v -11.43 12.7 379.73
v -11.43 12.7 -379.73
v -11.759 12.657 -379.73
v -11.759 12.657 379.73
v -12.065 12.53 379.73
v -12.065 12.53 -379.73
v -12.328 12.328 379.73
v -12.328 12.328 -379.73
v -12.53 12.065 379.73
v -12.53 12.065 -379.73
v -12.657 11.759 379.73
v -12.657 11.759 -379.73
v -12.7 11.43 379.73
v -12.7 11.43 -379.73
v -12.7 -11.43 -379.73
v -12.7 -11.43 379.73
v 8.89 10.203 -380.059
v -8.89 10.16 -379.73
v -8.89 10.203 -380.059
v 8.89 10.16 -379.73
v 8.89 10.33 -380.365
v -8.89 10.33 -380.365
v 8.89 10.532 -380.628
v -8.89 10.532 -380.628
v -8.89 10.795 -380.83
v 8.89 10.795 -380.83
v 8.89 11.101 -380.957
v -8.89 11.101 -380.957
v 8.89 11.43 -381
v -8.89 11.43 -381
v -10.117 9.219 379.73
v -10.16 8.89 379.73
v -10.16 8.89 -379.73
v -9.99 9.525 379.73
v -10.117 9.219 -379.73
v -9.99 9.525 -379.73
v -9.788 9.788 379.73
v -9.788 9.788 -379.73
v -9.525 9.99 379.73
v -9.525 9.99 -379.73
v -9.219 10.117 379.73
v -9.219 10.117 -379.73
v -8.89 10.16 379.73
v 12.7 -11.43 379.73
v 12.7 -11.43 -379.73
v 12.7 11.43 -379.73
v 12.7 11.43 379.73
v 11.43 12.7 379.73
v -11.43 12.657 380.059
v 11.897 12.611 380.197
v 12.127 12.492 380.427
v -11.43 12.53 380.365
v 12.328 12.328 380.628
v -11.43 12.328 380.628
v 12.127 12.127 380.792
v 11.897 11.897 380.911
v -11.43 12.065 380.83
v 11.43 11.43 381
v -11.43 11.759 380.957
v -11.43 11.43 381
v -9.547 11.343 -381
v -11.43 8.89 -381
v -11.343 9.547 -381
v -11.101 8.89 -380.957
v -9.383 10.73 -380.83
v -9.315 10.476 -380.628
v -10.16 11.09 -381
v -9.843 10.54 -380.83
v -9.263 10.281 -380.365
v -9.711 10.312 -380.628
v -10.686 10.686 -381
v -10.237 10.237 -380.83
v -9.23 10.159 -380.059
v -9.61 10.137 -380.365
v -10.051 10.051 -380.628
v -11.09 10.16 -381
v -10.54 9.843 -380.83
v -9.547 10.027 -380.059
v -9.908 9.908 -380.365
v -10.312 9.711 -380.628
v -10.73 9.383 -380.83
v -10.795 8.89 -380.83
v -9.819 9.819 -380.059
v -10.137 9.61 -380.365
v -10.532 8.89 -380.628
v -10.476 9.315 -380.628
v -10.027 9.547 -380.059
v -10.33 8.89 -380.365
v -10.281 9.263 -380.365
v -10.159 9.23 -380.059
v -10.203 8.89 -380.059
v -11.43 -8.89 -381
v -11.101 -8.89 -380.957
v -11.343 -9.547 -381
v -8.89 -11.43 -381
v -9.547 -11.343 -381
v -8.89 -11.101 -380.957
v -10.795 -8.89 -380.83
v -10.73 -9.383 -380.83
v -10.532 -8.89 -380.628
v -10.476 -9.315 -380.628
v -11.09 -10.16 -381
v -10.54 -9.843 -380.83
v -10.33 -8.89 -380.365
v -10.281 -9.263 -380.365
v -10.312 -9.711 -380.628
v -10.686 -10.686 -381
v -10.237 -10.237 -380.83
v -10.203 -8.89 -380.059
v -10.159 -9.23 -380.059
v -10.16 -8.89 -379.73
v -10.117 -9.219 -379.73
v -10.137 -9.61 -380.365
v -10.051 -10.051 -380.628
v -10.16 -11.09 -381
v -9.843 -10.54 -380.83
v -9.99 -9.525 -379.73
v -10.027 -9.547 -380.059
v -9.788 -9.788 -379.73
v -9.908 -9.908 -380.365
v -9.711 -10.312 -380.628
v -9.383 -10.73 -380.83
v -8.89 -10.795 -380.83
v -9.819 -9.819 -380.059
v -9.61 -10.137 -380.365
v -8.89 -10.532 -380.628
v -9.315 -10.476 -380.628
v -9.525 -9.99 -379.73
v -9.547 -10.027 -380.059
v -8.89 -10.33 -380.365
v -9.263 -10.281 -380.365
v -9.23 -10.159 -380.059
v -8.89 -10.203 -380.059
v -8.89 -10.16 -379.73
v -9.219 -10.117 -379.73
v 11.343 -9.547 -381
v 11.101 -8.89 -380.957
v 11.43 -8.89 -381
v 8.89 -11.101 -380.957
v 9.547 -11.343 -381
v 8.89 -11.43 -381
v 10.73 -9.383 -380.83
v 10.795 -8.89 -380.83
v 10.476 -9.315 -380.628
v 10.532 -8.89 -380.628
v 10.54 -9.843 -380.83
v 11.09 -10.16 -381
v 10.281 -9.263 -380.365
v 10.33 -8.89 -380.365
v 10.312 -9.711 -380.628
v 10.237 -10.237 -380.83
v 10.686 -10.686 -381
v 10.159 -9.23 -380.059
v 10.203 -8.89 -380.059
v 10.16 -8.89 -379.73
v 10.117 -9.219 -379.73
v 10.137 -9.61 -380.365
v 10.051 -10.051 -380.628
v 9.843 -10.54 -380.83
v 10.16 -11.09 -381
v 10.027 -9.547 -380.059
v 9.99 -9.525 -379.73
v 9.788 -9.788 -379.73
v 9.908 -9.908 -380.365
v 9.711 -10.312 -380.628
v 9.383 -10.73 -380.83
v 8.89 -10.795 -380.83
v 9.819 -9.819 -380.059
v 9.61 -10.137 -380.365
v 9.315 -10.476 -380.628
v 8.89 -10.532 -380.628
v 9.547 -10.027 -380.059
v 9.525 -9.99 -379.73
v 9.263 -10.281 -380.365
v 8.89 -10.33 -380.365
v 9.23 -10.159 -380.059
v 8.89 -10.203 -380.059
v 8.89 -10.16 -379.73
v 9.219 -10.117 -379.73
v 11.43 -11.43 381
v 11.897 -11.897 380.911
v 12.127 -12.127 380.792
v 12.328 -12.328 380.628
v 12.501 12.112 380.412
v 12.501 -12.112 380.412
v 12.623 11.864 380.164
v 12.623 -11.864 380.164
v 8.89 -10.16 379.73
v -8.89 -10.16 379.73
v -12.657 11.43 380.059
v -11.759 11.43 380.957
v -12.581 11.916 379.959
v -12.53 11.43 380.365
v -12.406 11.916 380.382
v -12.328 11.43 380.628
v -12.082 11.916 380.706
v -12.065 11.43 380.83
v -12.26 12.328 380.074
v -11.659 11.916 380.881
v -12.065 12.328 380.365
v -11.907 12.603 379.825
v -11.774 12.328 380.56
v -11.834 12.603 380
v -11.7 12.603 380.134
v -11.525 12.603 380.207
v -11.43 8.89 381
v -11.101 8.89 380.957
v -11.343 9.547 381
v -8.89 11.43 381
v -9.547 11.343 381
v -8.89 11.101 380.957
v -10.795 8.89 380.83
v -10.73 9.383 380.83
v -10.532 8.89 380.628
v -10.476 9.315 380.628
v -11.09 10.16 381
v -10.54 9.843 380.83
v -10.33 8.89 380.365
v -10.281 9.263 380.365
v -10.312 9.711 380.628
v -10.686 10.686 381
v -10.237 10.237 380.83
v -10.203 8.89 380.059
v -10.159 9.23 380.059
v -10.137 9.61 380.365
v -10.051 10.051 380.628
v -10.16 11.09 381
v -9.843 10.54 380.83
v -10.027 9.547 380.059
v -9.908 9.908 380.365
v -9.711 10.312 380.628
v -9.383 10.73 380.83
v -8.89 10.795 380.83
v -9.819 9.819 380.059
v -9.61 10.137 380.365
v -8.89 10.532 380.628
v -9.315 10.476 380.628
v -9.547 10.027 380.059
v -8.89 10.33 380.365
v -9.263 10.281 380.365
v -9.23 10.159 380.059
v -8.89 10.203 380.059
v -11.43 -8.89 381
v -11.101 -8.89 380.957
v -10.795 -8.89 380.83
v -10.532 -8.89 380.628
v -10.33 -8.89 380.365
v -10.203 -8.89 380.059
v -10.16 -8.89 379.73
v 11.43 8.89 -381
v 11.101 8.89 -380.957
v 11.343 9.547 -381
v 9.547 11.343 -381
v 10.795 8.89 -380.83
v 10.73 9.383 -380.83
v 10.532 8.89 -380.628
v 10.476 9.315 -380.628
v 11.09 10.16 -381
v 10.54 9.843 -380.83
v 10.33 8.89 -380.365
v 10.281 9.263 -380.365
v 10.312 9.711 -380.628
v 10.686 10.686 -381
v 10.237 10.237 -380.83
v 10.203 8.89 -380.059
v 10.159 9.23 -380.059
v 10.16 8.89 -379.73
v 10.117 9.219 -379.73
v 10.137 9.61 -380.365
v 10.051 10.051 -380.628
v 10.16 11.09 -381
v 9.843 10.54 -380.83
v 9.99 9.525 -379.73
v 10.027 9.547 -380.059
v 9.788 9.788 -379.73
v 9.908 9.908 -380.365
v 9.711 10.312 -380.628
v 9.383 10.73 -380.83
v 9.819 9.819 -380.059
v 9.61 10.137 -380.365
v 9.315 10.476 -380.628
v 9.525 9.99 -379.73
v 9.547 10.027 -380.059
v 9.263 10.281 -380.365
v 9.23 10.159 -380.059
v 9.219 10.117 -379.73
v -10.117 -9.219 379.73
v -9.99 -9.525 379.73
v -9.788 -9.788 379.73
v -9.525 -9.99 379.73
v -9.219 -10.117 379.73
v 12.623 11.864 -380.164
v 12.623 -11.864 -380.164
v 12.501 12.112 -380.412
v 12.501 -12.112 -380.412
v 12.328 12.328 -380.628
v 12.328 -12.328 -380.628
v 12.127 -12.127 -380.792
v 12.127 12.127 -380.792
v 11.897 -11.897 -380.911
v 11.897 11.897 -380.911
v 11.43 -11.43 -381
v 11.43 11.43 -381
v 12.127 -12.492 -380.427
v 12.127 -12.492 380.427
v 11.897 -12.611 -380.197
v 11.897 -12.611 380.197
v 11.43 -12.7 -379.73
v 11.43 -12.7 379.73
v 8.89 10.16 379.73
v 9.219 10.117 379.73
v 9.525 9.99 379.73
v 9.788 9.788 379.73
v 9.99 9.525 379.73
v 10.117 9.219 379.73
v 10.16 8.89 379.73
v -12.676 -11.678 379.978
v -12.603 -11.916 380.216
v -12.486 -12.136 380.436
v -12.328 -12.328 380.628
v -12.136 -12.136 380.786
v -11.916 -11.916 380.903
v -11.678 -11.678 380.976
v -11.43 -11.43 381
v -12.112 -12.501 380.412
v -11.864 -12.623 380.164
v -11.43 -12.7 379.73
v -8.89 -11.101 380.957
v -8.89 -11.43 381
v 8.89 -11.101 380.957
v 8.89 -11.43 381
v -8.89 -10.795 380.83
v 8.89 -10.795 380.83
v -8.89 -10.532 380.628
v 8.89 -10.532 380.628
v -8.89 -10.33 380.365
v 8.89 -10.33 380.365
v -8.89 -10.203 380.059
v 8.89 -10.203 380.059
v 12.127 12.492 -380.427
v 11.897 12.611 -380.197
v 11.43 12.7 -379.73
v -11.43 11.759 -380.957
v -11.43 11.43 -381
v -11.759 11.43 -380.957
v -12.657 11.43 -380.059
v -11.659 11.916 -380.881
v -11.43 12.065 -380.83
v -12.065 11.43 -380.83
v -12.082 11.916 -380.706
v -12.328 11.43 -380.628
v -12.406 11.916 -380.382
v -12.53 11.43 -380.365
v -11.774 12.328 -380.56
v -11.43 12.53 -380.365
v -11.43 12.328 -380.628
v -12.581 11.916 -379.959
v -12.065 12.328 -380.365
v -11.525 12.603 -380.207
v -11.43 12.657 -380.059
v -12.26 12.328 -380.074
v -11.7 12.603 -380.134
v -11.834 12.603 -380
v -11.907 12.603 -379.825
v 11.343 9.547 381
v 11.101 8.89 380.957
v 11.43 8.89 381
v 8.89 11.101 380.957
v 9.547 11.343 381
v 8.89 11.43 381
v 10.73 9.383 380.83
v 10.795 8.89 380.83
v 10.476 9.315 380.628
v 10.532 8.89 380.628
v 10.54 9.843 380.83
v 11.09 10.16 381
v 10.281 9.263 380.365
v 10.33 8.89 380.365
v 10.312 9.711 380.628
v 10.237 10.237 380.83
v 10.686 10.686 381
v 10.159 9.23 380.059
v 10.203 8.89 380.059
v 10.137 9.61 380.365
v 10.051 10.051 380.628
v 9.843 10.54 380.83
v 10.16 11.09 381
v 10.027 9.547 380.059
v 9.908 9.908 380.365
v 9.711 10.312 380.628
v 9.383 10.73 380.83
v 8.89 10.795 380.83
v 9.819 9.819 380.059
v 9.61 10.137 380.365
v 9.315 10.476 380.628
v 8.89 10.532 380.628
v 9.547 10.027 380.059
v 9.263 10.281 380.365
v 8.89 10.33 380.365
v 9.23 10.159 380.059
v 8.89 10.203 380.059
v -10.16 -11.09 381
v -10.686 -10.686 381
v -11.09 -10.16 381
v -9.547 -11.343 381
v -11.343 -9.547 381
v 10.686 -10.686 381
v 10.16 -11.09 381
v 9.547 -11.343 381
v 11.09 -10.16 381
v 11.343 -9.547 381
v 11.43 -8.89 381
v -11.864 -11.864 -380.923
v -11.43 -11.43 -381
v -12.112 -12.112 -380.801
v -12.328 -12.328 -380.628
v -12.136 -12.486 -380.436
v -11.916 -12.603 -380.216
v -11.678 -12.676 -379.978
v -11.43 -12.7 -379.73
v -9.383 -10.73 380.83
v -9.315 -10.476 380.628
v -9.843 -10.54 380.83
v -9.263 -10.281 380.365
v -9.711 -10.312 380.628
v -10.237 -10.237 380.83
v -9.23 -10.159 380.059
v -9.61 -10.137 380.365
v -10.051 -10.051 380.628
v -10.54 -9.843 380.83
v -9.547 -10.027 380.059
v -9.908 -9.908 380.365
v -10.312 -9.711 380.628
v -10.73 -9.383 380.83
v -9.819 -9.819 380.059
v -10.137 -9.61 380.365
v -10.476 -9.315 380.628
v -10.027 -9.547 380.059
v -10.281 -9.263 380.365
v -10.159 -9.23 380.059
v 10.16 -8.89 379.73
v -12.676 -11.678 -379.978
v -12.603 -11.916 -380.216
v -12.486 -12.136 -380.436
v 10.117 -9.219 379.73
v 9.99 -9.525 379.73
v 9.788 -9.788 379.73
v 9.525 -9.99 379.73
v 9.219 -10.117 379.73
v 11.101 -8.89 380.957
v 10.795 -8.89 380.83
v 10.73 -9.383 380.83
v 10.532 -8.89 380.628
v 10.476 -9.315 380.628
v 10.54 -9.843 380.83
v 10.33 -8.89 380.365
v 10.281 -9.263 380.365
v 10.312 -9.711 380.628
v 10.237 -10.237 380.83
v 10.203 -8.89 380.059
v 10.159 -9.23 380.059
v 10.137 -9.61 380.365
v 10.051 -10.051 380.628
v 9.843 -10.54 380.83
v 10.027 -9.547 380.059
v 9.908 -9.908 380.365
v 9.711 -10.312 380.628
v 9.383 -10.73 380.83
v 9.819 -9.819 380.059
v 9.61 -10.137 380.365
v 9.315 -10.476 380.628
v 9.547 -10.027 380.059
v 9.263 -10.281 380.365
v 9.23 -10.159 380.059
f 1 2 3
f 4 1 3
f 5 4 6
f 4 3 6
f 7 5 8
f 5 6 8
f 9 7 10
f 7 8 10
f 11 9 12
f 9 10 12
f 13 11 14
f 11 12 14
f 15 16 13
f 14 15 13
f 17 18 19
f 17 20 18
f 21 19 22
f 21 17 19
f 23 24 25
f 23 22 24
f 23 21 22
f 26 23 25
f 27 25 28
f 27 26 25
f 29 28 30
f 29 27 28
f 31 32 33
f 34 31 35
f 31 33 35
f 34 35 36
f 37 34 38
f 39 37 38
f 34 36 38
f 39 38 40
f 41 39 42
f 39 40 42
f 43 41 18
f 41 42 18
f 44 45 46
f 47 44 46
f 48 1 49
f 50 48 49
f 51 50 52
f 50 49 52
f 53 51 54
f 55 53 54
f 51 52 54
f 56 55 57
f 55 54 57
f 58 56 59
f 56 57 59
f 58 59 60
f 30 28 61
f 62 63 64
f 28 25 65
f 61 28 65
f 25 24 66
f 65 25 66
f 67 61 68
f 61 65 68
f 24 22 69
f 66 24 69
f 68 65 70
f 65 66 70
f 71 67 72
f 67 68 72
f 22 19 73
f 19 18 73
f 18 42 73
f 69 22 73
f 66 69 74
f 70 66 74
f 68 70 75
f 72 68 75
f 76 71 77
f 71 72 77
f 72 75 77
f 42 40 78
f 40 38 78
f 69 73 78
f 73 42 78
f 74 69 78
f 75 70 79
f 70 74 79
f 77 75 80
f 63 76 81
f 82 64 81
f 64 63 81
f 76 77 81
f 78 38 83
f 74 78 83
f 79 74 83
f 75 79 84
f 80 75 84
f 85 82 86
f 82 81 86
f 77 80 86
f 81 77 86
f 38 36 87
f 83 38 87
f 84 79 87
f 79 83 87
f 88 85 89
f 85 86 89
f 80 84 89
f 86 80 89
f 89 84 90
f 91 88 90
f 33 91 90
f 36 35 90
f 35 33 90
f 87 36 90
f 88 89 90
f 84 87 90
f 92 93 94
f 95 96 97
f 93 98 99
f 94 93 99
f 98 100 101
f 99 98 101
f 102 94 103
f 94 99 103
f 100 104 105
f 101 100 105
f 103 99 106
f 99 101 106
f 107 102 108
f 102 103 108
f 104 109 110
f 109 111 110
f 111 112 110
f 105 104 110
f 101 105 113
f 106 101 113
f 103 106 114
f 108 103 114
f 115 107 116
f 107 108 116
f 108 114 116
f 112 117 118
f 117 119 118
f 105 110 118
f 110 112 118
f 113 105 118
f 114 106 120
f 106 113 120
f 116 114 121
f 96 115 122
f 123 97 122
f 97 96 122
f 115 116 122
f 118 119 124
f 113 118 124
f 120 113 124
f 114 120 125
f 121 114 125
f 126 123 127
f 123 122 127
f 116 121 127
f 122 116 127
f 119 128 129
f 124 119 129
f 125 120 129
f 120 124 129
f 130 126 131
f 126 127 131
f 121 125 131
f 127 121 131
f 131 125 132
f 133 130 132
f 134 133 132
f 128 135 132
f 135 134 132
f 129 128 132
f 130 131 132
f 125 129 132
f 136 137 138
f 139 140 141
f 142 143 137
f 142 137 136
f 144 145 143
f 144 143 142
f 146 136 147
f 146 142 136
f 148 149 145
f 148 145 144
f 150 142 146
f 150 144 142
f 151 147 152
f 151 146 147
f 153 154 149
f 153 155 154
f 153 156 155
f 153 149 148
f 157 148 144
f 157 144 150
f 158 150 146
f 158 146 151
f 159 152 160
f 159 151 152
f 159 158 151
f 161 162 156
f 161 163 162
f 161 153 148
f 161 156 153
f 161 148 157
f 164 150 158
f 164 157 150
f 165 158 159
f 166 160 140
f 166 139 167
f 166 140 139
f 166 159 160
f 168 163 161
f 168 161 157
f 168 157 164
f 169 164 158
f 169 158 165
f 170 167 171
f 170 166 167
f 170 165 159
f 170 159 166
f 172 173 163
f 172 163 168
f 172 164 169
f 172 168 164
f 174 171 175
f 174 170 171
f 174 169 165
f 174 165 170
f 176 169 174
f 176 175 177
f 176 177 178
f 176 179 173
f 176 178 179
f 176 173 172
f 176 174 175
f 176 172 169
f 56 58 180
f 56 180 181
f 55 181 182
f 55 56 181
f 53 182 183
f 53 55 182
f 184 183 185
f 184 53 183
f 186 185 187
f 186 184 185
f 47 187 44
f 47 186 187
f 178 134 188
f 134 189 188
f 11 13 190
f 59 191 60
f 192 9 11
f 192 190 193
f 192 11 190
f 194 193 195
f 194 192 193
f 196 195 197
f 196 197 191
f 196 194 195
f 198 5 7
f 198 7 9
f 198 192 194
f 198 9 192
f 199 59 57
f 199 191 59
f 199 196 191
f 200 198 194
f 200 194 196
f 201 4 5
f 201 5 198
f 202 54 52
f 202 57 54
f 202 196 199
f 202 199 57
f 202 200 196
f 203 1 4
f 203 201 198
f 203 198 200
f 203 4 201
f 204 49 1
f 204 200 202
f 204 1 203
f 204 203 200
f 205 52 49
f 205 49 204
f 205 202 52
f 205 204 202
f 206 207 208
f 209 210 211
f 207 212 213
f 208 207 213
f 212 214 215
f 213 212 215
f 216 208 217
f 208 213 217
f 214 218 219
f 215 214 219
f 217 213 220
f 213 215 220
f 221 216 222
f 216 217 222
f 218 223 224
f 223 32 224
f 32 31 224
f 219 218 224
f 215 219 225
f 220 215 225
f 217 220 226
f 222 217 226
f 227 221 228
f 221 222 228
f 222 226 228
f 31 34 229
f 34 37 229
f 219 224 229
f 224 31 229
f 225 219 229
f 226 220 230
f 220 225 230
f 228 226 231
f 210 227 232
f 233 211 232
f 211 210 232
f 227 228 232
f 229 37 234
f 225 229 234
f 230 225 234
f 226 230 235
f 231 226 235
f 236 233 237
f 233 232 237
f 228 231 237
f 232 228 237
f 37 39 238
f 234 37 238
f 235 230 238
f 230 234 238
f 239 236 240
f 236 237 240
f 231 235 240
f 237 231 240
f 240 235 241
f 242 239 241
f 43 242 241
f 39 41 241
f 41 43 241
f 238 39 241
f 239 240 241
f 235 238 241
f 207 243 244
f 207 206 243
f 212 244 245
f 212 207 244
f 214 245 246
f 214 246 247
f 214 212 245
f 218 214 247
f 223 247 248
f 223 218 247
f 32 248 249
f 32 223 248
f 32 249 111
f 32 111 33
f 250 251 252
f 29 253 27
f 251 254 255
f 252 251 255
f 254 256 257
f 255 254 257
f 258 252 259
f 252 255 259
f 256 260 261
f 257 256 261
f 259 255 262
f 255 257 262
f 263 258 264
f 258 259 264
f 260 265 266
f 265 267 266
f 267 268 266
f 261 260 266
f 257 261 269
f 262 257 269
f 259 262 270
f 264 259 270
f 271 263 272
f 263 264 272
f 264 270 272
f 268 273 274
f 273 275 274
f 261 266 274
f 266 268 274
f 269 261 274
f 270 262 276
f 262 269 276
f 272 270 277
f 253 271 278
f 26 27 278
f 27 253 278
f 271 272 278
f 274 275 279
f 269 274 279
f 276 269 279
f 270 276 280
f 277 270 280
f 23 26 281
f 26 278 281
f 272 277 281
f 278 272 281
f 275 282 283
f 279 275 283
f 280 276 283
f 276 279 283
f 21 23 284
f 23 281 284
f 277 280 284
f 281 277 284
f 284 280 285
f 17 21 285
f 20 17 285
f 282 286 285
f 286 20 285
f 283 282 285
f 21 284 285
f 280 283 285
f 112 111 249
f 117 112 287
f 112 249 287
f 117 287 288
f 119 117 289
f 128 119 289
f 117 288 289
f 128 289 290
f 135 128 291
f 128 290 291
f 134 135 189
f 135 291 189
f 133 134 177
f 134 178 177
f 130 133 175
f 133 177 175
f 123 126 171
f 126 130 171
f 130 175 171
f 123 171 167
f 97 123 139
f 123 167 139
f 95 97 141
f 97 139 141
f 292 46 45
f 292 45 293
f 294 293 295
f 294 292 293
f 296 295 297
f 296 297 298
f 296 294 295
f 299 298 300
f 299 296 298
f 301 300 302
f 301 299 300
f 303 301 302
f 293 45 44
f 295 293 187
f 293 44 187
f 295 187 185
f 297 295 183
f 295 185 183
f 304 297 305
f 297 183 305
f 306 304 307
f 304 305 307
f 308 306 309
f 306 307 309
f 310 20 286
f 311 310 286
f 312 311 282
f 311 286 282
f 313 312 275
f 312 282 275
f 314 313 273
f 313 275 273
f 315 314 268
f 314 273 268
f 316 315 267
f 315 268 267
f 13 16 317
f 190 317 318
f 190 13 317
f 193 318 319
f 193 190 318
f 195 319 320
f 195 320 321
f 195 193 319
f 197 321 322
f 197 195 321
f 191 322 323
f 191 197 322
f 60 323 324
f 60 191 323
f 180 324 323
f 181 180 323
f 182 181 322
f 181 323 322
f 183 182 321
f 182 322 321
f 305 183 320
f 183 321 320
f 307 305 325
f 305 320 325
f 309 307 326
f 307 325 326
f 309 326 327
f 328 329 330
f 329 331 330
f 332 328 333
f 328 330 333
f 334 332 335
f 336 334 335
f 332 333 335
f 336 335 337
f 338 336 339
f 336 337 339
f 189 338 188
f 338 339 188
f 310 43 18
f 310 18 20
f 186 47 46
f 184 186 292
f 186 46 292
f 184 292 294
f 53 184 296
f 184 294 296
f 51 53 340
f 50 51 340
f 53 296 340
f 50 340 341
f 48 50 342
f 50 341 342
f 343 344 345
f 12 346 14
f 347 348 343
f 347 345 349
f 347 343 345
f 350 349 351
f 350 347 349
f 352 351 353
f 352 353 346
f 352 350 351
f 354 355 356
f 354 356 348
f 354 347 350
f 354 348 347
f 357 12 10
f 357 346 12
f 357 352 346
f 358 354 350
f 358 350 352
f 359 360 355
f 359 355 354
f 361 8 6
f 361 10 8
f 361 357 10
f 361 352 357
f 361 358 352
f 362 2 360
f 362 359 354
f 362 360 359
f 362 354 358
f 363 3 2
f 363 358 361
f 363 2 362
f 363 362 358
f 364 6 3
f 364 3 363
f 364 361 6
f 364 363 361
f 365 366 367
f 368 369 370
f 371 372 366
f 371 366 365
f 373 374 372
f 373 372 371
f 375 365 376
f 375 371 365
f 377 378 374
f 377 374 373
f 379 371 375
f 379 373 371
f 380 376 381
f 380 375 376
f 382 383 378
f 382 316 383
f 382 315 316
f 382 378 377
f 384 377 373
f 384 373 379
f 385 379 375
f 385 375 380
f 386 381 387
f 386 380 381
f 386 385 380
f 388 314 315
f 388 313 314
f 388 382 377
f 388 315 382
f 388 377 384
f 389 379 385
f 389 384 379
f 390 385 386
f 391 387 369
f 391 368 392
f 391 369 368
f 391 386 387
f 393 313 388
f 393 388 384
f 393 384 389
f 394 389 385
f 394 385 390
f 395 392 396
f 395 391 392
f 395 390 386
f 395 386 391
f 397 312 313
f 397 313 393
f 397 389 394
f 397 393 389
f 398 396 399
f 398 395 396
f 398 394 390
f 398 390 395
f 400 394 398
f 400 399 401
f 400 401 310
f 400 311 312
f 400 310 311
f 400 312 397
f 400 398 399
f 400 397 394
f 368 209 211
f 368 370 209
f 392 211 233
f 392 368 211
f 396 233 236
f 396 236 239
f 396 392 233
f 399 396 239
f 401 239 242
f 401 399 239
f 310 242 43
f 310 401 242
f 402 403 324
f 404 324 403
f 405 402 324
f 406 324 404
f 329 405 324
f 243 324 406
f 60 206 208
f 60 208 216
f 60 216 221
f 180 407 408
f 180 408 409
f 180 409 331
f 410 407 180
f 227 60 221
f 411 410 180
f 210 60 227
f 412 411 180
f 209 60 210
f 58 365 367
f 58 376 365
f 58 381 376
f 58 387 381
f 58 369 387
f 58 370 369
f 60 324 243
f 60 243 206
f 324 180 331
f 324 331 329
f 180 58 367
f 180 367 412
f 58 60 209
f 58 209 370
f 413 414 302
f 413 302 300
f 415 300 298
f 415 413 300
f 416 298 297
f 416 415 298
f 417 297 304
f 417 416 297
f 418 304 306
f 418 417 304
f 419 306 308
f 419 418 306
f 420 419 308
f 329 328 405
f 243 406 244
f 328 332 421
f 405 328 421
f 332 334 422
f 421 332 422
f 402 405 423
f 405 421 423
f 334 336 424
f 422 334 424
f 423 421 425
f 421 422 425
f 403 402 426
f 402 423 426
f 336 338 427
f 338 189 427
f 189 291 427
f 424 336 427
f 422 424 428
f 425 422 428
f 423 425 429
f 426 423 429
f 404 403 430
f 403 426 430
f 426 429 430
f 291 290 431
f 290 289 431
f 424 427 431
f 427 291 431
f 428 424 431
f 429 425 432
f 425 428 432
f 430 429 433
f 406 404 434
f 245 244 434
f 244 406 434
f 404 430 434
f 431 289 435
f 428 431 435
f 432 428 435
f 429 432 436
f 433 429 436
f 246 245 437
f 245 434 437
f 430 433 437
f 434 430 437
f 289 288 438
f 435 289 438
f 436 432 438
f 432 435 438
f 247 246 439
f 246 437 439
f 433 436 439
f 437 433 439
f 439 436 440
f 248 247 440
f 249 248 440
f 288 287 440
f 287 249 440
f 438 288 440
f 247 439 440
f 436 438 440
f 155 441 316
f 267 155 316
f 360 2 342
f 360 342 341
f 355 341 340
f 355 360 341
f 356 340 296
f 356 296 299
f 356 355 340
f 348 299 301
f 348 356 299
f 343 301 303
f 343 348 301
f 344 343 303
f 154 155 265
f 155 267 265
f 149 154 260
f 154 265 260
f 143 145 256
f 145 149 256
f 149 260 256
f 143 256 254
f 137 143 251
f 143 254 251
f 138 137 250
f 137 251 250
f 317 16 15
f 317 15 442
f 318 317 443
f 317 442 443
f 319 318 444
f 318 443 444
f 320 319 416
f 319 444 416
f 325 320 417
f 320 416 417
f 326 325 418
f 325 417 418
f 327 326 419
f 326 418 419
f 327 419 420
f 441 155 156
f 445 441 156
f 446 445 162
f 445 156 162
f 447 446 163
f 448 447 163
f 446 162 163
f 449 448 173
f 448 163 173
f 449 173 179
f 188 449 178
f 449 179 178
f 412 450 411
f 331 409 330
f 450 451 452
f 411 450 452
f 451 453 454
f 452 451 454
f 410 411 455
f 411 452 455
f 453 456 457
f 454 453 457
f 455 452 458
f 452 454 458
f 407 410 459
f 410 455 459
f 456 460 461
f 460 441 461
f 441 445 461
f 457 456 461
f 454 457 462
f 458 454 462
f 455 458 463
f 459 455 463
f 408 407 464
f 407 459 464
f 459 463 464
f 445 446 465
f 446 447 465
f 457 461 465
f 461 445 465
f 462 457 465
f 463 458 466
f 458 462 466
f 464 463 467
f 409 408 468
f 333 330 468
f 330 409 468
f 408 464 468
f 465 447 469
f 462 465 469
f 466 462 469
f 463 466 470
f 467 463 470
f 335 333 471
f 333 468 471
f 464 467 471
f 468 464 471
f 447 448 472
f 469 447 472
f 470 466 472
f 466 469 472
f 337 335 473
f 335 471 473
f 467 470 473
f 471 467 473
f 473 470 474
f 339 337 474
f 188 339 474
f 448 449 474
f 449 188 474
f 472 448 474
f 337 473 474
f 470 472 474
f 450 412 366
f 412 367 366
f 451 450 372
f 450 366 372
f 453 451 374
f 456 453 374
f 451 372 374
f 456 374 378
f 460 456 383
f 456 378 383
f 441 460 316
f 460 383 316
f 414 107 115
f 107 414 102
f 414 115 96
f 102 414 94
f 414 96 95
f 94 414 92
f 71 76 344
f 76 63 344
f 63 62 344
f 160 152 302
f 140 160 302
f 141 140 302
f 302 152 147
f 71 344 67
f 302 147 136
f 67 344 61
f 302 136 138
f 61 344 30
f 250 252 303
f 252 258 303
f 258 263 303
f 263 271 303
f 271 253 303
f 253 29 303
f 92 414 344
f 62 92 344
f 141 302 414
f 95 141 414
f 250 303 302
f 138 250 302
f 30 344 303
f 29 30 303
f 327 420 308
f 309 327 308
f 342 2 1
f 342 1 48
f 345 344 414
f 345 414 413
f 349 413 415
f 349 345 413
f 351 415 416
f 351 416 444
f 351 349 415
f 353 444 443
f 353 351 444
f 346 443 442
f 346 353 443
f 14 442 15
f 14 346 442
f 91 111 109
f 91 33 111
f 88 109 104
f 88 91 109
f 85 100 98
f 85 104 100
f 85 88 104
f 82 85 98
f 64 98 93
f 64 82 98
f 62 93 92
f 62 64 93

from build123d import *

# Parameters (mm, degrees)
F0_W         = 25.4
F0_H         = 25.4
F0_W_2       = 20.32
F0_H_2       = 20.32
F1_DEPTH     = 381
F2_R         = 1.26999
F3_T1_DEPTH  = 30.48001
F3_T3_DEPTH  = 768.35
F4_T1_DEPTH  = 26.03501
F4_T3_DEPTH  = 759.46
F4_T5_DEPTH  = 26.035
F4_S9_W      = 1.2954
F4_S9_H      = 1.2954
F4_T10_DEPTH = 1.2954
F4_S15_W     = 1.2954
F4_S15_H     = 1.2954
F4_T16_DEPTH = 1.2954


# Not quite as in the source:
# - a fillet or chamfer that OpenCascade refuses, or shapes differently, is made with other operations: its cross-section is extruded or revolved along the edge and cut away or added
# - a fillet or chamfer is up to 0.001 mm smaller than in the source, because OpenCascade refuses the exact size


with BuildPart() as f1:
    # F0 (on Top) → F1 (new body, symmetric)
    with BuildSketch(Plane.XY):
        Rectangle(F0_W, F0_H)
        Rectangle(F0_W_2, F0_H_2, mode=Mode.SUBTRACT)
    extrude(amount=F1_DEPTH, both=True)

    # F2 (radius 1.27 in the source; OpenCascade refuses exactly that, so slightly less here)
    f2_edges = [f1.edges().sort_by_distance(p)[0] for p in [
        (0, -10.16, -381),
        (-10.16, -10.16, 0),
        (0, -10.16, 381),
        (10.16, -10.16, 0),
        (10.16, 10.16, 0),
        (10.16, 0, -381),
        (10.16, 0, 381),
        (-10.16, 0, -381),
        (-10.16, 10.16, 0),
        (-10.16, 0, 381),
        (0, 10.16, -381),
        (0, 10.16, 381),
        (12.7, -12.7, 0),
        (12.7, 0, -381),
        (12.7, 12.7, 0),
        (12.7, 0, 381),
    ]]
    fillet(f2_edges, radius=F2_R)

    # F3: fillet of radius 1.27 on 8 edges, made by hand

    # F3_s2 → F3_t1 (cut)
    with BuildSketch(Plane.YZ.offset(-15.875)):
        with BuildLine():
            ThreePointArc((-11.43, -381), (-12.3280256121, -380.6280256121), (-12.7, -379.73))
            Line((-12.7, -379.73), (-12.7, -381))
            Line((-12.7, -381), (-11.43, -381))
        make_face()
        with BuildLine():
            ThreePointArc((-11.43, 381), (-12.3280256121, 380.6280256121), (-12.7, 379.73))
            Line((-12.7, 379.73), (-12.7, 381))
            Line((-12.7, 381), (-11.43, 381))
        make_face()
    extrude(amount=F3_T1_DEPTH, mode=Mode.SUBTRACT)

    # F3_s4 → F3_t3 (cut)
    with BuildSketch(Plane.XY.offset(-384.175)):
        with BuildLine():
            ThreePointArc((-12.7, -11.43), (-12.3280256121, -12.3280256121), (-11.43, -12.7))
            Line((-11.43, -12.7), (-12.7, -12.7))
            Line((-12.7, -12.7), (-12.7, -11.43))
        make_face()
    extrude(amount=F3_T3_DEPTH, mode=Mode.SUBTRACT)

    # F4: fillet of radius 1.27 on 7 edges, made by hand

    # F4_s2 → F4_t1 (cut)
    with BuildSketch(Plane.YZ.offset(-11.43)):
        with BuildLine():
            ThreePointArc((12.7, -379.73), (12.3280256121, -380.6280256121), (11.43, -381))
            Line((11.43, -381), (12.7, -381))
            Line((12.7, -381), (12.7, -379.73))
        make_face()
        with BuildLine():
            ThreePointArc((12.7, 379.73), (12.3280256121, 380.6280256121), (11.43, 381))
            Line((11.43, 381), (12.7, 381))
            Line((12.7, 381), (12.7, 379.73))
        make_face()
    extrude(amount=F4_T1_DEPTH, mode=Mode.SUBTRACT)

    # F4_s4 → F4_t3 (cut)
    with BuildSketch(Plane.XY.offset(-379.73)):
        with BuildLine():
            ThreePointArc((-11.43, 12.7), (-12.3280256121, 12.3280256121), (-12.7, 11.43))
            Line((-12.7, 11.43), (-12.7, 12.7))
            Line((-12.7, 12.7), (-11.43, 12.7))
        make_face()
    extrude(amount=F4_T3_DEPTH, mode=Mode.SUBTRACT)

    # F4_s6 → F4_t5 (cut)
    with BuildSketch(Plane.XZ.offset(-11.43)):
        with BuildLine():
            ThreePointArc((-12.7, 379.73), (-12.3280256121, 380.6280256121), (-11.43, 381))
            Line((-11.43, 381), (-12.7, 381))
            Line((-12.7, 381), (-12.7, 379.73))
        make_face()
        with BuildLine():
            ThreePointArc((-11.43, -381), (-12.3280256121, -380.6280256121), (-12.7, -379.73))
            Line((-12.7, -379.73), (-12.7, -381))
            Line((-12.7, -381), (-11.43, -381))
        make_face()
    extrude(amount=F4_T5_DEPTH, mode=Mode.SUBTRACT)


with BuildPart() as f4_tool8:
    # F4_s9 → F4_t10 (new body)
    with BuildSketch(Plane.XZ.offset(-11.43)):
        with Locations((-12.0777, -380.3777)):
            Rectangle(F4_S9_W, F4_S9_H)
    extrude(amount=-F4_T10_DEPTH)

    # F4_s11 → F4_t12 (revolve, cut)
    with BuildSketch(Plane(origin=(-11.43, 11.43, -379.73), x_dir=(0.7071067812, 0, 0.7071067812), z_dir=(-0.7071067812, 0, 0.7071067812))):
        with BuildLine():
            ThreePointArc((0, -1.27), (1.27, 0), (0, 1.27))
            Line((0, 1.27), (0, -1.27))
        make_face()
    revolve(axis=Axis((-11.43, 11.43, -379.73), (0, 1, 0)), mode=Mode.SUBTRACT)


with BuildPart() as f1_1:
    add(f1.part)

    # F4_t7: cut F4_tool8
    add(f4_tool8.part, mode=Mode.SUBTRACT)


with BuildPart() as f4_tool14:
    # F4_s15 → F4_t16 (new body)
    with BuildSketch(Plane.XZ.offset(-11.43)):
        with Locations((-12.0777, 380.3777)):
            Rectangle(F4_S15_W, F4_S15_H)
    extrude(amount=-F4_T16_DEPTH)

    # F4_s17 → F4_t18 (revolve, cut)
    with BuildSketch(Plane(origin=(-11.43, 11.43, 379.73), x_dir=(0.7071067812, 0, -0.7071067812), z_dir=(0.7071067812, 0, 0.7071067812))):
        with BuildLine():
            ThreePointArc((0, -1.27), (1.27, 0), (0, 1.27))
            Line((0, 1.27), (0, -1.27))
        make_face()
    revolve(axis=Axis((-11.43, 11.43, 379.73), (0, 1, 0)), mode=Mode.SUBTRACT)


with BuildPart() as f1_2:
    add(f1_1.part)

    # F4_t13: cut F4_tool14
    add(f4_tool14.part, mode=Mode.SUBTRACT)


solid = f1_2.part
